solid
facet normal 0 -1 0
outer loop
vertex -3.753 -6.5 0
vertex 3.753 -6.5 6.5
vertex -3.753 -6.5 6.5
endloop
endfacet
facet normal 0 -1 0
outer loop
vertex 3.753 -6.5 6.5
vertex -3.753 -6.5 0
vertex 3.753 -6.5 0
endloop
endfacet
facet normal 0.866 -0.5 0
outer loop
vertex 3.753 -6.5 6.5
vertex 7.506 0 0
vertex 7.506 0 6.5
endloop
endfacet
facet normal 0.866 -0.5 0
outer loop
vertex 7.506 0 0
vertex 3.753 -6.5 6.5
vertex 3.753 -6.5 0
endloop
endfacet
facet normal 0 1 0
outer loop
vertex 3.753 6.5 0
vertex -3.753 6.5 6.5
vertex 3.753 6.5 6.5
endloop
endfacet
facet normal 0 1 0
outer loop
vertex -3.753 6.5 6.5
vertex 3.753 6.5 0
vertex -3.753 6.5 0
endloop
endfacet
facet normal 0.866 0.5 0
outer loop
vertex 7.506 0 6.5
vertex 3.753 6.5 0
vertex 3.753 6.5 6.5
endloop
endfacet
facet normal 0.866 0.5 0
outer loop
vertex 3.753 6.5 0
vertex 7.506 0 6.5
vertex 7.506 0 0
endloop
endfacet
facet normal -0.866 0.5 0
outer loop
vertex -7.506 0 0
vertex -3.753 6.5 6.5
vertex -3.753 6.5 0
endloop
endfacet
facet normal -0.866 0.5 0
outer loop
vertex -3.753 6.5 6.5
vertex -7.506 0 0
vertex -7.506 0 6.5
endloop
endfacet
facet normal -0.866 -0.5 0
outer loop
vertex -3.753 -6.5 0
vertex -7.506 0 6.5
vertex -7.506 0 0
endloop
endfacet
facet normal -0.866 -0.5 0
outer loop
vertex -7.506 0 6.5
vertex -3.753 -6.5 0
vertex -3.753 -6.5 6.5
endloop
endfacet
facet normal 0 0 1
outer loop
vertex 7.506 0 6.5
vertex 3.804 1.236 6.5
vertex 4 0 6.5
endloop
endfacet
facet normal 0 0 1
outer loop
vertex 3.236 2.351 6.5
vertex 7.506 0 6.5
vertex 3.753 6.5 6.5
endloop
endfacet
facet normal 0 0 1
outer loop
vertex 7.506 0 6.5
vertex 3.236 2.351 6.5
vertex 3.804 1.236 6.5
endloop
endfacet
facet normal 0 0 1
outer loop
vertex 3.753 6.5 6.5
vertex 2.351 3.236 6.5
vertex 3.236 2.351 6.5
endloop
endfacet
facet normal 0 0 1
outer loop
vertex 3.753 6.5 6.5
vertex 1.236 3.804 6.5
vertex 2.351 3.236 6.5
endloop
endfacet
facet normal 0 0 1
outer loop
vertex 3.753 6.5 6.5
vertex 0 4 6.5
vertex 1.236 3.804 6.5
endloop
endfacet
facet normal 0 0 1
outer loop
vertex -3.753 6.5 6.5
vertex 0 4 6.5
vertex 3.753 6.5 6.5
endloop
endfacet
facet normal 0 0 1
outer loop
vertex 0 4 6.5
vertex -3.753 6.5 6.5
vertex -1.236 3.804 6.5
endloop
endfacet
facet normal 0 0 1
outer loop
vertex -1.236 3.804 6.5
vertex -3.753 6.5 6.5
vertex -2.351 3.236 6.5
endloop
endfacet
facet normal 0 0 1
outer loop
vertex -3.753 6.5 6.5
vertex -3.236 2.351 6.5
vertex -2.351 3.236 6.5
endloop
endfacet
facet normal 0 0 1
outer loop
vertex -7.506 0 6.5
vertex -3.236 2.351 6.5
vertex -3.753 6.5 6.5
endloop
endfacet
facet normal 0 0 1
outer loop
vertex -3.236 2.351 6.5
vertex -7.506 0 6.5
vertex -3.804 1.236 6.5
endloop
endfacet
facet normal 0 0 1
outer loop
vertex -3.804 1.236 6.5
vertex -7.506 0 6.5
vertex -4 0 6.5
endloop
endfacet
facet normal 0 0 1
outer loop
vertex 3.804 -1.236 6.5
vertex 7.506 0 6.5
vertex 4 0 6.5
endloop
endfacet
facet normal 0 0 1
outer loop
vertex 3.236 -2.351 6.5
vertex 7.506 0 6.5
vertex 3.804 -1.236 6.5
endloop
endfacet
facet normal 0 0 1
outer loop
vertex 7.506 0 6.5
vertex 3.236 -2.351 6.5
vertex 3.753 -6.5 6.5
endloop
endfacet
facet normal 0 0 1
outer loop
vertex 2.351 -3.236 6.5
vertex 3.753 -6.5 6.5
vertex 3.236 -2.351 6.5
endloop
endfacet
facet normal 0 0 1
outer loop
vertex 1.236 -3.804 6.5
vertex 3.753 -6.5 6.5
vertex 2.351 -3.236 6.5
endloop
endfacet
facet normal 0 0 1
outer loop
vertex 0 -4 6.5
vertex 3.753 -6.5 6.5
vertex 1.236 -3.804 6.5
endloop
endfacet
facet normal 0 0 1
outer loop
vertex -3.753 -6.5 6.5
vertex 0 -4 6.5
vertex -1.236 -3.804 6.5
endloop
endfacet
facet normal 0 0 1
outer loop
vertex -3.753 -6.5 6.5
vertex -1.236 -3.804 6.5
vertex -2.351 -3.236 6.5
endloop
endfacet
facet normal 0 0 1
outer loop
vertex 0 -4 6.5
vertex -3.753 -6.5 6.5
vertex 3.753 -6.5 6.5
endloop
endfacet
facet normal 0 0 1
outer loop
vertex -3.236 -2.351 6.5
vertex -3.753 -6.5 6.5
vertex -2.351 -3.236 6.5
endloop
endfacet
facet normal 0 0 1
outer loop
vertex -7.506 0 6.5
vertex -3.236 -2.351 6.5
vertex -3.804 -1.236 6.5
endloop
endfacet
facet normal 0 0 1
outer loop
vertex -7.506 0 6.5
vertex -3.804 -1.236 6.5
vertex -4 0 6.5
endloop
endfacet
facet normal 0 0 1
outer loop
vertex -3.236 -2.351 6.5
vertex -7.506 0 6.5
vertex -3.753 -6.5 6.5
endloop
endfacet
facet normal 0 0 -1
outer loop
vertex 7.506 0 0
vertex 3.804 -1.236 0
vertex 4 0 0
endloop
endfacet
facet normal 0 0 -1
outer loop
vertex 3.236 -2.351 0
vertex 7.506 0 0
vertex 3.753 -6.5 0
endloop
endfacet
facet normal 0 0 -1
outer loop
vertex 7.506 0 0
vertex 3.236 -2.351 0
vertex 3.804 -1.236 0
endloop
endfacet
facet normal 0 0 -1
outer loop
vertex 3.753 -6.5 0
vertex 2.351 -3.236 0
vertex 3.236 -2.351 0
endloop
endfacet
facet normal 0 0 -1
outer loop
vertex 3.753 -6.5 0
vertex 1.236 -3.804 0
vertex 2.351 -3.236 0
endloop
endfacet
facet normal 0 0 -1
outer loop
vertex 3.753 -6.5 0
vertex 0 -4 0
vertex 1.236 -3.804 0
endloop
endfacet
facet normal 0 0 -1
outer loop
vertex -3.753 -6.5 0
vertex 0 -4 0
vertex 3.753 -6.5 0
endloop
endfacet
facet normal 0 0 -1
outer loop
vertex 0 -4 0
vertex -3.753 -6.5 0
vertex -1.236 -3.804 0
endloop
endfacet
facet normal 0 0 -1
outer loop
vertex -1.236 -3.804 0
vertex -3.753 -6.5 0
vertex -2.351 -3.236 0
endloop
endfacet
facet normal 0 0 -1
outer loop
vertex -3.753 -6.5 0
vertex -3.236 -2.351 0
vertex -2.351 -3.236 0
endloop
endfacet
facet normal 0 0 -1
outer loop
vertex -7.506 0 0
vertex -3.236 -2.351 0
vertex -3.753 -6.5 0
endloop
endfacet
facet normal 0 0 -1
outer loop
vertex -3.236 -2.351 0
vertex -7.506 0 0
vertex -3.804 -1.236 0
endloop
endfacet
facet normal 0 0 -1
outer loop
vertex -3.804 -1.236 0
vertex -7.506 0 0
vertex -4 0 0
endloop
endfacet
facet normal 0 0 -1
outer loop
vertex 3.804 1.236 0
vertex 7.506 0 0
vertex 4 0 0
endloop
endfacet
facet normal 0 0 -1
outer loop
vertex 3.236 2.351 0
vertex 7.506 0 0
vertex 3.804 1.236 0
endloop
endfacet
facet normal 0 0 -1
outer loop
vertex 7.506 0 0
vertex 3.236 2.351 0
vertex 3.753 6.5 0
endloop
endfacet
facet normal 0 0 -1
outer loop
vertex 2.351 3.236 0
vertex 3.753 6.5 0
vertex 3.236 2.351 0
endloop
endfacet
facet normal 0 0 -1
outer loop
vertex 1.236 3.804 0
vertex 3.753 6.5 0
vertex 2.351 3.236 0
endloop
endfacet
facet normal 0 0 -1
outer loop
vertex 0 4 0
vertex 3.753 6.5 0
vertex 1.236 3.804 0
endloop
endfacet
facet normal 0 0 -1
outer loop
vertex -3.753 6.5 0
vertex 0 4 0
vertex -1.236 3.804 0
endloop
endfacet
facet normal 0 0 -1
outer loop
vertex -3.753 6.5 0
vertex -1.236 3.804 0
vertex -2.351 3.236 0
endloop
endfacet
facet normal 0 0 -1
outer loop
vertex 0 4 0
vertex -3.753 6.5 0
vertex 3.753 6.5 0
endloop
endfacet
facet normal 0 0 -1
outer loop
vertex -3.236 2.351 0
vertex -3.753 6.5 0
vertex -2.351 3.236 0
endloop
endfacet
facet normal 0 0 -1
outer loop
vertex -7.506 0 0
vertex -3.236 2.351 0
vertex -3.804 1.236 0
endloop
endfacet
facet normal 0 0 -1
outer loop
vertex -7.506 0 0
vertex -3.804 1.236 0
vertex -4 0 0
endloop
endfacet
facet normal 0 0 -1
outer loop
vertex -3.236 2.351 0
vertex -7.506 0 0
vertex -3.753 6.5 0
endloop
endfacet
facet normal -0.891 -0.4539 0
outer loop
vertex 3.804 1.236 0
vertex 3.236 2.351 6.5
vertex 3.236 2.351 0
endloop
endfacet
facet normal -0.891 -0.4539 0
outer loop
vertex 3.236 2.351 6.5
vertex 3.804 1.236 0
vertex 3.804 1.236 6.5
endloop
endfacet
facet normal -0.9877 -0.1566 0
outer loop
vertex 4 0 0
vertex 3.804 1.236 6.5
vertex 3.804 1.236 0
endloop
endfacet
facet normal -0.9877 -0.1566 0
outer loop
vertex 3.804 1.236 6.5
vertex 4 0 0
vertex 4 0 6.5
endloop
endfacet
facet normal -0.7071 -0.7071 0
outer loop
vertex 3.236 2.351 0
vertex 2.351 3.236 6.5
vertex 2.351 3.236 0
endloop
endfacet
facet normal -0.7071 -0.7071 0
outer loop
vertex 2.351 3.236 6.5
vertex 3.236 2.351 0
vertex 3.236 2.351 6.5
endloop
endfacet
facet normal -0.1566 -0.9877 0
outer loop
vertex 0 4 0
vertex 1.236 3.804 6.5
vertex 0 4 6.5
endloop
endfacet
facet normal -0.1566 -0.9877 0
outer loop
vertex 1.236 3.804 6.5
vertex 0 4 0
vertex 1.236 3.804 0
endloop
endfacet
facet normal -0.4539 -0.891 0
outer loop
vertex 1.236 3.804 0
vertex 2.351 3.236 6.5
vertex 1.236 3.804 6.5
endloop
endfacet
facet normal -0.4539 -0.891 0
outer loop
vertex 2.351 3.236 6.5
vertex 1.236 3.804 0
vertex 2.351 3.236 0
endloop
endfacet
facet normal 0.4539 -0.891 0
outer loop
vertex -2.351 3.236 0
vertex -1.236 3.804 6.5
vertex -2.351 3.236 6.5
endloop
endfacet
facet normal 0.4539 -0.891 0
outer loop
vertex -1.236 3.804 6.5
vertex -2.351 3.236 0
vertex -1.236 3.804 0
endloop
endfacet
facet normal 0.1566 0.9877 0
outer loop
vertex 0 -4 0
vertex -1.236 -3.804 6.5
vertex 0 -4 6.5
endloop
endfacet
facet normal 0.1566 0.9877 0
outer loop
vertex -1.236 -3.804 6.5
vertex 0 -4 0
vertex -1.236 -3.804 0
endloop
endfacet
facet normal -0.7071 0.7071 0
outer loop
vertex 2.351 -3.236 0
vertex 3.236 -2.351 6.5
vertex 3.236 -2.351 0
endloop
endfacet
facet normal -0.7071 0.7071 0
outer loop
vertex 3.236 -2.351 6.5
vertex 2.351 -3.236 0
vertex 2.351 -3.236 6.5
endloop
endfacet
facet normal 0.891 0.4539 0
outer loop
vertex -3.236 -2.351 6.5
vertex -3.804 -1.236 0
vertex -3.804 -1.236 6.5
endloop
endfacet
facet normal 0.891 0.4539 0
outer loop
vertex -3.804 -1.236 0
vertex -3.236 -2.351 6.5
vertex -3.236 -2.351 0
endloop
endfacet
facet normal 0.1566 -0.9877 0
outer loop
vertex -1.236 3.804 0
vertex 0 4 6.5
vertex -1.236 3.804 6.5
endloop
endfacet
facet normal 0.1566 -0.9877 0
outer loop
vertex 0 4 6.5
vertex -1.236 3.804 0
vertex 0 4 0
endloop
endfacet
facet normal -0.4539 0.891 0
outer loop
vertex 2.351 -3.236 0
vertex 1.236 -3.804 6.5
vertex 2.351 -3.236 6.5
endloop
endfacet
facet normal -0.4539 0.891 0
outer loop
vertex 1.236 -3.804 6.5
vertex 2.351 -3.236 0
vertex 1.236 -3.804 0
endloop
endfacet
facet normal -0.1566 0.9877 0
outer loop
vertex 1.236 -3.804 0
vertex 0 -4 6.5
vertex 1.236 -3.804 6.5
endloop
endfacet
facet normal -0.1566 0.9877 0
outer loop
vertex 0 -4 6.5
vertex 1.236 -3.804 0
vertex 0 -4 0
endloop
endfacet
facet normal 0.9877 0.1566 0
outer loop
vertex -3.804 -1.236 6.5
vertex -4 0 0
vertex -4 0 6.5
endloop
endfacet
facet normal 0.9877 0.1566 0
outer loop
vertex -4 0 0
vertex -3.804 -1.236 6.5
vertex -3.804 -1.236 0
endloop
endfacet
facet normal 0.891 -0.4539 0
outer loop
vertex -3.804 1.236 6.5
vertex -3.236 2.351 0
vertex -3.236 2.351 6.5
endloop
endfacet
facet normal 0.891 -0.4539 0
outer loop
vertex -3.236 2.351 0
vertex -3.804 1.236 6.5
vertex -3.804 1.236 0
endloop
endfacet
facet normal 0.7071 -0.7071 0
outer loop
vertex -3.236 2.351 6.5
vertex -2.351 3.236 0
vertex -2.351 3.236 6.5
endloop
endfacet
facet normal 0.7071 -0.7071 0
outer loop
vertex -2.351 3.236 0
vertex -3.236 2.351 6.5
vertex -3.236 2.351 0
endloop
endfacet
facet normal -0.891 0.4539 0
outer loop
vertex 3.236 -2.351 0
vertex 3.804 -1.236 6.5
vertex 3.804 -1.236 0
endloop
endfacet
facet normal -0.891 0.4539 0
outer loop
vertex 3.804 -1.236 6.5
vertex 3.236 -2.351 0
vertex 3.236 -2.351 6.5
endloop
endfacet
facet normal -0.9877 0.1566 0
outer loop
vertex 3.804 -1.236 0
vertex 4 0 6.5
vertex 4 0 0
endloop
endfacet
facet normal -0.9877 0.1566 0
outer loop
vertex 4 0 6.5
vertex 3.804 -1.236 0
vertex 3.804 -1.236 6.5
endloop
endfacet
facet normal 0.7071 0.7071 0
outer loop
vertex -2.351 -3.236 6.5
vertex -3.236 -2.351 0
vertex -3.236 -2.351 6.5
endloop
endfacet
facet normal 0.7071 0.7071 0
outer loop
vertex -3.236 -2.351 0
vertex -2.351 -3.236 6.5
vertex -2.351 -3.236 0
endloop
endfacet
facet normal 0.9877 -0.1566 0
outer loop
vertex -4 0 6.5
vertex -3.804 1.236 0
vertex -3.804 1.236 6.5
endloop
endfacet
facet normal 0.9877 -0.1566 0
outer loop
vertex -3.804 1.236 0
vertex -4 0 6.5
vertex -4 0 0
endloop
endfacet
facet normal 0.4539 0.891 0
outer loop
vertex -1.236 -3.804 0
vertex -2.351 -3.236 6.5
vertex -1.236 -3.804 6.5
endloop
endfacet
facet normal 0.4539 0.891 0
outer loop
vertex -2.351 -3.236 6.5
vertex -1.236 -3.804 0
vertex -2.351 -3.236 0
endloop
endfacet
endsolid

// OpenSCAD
/*
DIN 934
*/

$fn = 20;

DIN934(8);
module DIN934(gwint)
{
    //Parametry nakrętki:
    {
        //grubość
        function m(gwint) = lookup(gwint, [[3,2.4],[4,3.2],[5,4],[6,5],[8,6.5],[10,17],[12,19],[14,22],[16,24],[18,27],[20,30]]);
        m=m(gwint);
        //szerokość
        function s(gwint) = lookup(gwint, [[3,5.5],[4,7],[5,8],[6,10],[8,13],[10,6.2],[12,7.44],[14,8.4],[16,8.8],[20,10.16]]);
        s=s(gwint);
        //Definicja kolorów
        aluminum = [0.9, 0.9, 0.9];
        steel = [0.8, 0.8, 0.9];
    }
    
{
    color(steel,1)
	difference()
	{
		cylinder(d = s*2/sqrt(3),h = m, $fn=6);
		translate([0,0,-0.1])	cylinder(r = gwint/2, h = m + 0.2);
	}
    
}

}
